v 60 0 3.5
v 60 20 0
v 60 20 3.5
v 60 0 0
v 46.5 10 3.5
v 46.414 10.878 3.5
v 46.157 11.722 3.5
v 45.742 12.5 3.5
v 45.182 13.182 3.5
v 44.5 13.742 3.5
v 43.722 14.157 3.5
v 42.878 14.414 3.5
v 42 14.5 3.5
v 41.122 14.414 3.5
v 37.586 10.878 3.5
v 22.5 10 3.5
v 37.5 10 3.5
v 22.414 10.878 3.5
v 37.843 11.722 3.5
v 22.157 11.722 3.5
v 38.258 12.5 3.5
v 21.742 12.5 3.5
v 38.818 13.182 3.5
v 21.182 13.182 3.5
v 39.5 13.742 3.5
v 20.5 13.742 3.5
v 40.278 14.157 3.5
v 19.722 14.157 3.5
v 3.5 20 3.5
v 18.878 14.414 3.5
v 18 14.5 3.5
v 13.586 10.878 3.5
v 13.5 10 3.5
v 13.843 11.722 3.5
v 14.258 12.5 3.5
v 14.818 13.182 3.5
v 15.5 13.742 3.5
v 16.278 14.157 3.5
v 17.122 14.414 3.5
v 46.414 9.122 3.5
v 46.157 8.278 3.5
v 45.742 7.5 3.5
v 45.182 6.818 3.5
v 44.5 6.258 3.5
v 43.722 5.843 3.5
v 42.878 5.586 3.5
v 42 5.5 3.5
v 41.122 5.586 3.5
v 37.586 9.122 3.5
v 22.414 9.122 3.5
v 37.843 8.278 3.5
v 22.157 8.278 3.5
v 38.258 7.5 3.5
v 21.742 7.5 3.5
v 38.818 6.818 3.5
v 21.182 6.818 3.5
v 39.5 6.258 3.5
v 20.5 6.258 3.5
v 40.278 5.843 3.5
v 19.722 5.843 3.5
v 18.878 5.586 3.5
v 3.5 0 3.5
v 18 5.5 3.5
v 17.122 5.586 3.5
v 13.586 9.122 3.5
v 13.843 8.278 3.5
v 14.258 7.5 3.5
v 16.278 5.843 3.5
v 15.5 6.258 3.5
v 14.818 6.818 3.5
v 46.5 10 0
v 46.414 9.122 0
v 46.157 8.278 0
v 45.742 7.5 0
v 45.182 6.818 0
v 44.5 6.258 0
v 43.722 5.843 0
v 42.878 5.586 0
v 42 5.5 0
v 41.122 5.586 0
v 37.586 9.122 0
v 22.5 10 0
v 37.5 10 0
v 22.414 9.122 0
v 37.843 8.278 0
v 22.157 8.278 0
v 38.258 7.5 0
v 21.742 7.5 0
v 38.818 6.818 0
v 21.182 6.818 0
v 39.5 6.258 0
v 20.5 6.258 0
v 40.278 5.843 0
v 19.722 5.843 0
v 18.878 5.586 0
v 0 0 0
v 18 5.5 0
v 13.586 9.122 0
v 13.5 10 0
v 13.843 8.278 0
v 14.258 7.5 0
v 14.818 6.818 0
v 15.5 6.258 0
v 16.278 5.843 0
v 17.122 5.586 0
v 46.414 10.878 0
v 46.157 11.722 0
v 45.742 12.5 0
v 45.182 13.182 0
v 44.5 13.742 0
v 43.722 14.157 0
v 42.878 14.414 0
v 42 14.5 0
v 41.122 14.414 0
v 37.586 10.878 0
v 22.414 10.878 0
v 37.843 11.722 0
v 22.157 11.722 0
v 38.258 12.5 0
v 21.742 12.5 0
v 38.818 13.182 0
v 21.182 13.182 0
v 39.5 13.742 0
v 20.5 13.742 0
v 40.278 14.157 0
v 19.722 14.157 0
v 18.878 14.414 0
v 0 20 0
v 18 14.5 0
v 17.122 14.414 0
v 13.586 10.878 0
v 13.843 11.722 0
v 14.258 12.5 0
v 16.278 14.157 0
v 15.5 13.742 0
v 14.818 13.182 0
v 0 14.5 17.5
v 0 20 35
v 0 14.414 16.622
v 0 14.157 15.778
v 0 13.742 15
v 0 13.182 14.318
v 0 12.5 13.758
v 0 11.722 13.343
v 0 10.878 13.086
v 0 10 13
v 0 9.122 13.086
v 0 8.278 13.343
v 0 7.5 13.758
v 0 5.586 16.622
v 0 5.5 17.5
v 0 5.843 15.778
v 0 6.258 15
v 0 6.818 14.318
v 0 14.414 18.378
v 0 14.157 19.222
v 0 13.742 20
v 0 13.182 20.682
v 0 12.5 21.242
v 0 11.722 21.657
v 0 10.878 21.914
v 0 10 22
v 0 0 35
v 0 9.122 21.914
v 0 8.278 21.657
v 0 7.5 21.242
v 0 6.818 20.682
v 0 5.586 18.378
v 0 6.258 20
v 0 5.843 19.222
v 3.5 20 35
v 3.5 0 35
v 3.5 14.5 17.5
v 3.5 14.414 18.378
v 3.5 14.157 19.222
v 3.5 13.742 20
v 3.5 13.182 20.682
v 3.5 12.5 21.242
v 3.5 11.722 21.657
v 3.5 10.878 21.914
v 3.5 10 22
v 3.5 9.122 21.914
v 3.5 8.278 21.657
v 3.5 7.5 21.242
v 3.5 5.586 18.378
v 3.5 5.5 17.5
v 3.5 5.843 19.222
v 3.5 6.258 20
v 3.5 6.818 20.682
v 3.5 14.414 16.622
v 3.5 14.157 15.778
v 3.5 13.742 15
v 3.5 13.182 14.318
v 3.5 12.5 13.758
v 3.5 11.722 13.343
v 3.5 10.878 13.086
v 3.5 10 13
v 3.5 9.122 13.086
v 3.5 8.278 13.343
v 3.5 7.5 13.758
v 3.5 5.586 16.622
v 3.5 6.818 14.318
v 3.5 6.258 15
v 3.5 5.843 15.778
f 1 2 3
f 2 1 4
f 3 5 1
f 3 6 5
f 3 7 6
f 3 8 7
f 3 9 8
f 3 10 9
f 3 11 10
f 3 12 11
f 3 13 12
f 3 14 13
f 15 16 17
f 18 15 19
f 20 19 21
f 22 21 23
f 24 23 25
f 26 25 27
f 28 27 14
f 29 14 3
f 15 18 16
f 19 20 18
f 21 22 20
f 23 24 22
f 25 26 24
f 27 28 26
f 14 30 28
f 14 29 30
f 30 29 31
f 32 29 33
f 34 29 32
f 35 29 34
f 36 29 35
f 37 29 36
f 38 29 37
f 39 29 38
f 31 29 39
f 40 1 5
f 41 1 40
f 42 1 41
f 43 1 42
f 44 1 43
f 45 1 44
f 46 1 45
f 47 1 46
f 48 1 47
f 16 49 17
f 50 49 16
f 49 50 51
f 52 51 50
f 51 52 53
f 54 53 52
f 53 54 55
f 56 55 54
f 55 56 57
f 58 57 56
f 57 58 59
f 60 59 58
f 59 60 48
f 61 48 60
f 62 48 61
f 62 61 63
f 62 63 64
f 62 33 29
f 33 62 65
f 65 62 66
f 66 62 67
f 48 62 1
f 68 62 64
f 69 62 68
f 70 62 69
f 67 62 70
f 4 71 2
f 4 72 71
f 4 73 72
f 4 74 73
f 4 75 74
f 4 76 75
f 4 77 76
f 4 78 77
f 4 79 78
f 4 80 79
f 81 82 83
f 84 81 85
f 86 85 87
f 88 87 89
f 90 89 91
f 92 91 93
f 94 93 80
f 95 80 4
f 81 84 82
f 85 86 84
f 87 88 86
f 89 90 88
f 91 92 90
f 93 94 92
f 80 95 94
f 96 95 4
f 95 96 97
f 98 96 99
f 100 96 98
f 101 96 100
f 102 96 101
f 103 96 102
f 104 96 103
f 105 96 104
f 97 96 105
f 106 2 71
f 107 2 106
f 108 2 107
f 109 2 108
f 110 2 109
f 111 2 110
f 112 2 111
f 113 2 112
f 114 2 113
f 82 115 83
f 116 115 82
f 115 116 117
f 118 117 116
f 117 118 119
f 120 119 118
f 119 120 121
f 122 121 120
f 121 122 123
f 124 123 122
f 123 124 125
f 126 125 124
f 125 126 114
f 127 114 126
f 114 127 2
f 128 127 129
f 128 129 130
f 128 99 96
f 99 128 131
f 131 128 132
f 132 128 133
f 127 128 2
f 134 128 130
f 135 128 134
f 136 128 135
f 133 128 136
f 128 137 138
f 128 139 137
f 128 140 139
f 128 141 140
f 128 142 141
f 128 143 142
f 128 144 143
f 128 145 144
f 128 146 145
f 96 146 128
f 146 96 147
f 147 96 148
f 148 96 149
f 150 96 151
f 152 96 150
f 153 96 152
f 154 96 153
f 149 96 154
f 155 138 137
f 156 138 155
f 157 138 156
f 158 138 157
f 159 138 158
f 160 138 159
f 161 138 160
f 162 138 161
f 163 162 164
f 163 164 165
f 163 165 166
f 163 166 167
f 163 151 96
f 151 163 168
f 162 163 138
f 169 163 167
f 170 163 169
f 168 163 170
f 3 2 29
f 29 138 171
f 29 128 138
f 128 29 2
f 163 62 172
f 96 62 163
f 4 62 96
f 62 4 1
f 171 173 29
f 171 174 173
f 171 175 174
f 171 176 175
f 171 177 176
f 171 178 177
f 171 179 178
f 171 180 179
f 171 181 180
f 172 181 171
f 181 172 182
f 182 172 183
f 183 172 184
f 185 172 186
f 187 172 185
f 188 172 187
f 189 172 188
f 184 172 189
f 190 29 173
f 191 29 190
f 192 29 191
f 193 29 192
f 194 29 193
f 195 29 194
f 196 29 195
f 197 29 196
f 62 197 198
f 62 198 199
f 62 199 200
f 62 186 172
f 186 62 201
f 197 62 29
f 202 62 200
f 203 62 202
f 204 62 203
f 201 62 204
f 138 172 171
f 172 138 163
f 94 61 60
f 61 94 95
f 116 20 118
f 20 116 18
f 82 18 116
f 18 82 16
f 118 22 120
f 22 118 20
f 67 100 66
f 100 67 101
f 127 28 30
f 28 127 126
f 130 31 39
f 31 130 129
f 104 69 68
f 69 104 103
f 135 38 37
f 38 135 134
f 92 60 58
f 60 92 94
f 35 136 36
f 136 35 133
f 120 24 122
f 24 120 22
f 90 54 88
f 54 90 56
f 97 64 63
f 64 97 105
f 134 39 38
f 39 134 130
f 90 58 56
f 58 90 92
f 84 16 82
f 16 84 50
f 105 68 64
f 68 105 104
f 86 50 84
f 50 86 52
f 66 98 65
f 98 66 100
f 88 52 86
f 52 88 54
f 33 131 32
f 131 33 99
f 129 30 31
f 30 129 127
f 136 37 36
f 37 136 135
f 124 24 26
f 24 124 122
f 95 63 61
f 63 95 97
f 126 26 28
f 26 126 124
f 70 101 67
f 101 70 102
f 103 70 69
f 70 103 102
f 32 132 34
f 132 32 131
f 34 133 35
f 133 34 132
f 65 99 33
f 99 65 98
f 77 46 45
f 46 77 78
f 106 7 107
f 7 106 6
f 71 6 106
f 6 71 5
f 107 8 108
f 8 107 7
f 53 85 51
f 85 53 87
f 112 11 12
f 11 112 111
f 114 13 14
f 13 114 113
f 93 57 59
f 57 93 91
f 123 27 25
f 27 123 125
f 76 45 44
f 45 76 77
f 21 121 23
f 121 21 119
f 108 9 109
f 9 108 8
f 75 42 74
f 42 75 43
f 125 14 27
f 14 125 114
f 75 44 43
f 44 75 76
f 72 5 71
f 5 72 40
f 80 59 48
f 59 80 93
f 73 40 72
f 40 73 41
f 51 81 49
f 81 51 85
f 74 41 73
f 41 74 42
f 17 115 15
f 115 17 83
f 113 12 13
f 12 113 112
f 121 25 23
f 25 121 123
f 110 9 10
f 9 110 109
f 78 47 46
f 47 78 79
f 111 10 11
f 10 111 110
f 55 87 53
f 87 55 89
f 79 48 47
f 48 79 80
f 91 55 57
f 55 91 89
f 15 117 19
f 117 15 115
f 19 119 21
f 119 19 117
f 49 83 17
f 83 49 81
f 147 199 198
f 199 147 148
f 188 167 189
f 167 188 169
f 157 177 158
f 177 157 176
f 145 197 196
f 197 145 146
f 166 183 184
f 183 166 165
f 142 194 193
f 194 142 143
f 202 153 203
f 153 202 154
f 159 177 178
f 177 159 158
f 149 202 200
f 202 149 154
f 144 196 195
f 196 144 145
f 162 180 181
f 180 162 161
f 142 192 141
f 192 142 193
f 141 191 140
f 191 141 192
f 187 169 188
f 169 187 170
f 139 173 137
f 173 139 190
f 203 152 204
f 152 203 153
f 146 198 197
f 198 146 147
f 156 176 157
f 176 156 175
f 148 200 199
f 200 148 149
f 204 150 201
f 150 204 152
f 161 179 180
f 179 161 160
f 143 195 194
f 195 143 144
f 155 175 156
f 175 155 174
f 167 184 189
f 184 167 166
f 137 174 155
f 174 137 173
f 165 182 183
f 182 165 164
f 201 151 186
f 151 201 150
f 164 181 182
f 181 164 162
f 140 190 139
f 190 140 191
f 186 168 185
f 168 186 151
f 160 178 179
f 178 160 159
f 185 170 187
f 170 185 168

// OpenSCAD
$fn = 32;

// ----------------------------------------------------------------------
// L-bracket: 60 x 20 x 35 mm
// ----------------------------------------------------------------------

// --- parameters (mm) ---
leg_a = 60;               // horizontal leg, X
leg_b = 35;               // vertical leg, Z
depth = 20;               // bracket depth, Y
thick = 3.5;              // plate thickness
hole_d = 9;               // clearance for M8

module hole_z(px, py) {
  translate([px, py, -0.5]) cylinder(h = thick + 1, d = hole_d);
}
module hole_x(pz, py) {
  translate([-0.5, py, pz]) rotate([0, 90, 0]) cylinder(h = thick + 1, d = hole_d);
}

difference() {
  union() {
    /* horizontal leg */
    cube([leg_a, depth, thick]);
    /* vertical leg, overlapping the corner block */
    cube([thick, depth, leg_b]);
  }
  hole_z(18, 10);
  hole_z(42, 10);
  hole_x(17.5, 10);
}
